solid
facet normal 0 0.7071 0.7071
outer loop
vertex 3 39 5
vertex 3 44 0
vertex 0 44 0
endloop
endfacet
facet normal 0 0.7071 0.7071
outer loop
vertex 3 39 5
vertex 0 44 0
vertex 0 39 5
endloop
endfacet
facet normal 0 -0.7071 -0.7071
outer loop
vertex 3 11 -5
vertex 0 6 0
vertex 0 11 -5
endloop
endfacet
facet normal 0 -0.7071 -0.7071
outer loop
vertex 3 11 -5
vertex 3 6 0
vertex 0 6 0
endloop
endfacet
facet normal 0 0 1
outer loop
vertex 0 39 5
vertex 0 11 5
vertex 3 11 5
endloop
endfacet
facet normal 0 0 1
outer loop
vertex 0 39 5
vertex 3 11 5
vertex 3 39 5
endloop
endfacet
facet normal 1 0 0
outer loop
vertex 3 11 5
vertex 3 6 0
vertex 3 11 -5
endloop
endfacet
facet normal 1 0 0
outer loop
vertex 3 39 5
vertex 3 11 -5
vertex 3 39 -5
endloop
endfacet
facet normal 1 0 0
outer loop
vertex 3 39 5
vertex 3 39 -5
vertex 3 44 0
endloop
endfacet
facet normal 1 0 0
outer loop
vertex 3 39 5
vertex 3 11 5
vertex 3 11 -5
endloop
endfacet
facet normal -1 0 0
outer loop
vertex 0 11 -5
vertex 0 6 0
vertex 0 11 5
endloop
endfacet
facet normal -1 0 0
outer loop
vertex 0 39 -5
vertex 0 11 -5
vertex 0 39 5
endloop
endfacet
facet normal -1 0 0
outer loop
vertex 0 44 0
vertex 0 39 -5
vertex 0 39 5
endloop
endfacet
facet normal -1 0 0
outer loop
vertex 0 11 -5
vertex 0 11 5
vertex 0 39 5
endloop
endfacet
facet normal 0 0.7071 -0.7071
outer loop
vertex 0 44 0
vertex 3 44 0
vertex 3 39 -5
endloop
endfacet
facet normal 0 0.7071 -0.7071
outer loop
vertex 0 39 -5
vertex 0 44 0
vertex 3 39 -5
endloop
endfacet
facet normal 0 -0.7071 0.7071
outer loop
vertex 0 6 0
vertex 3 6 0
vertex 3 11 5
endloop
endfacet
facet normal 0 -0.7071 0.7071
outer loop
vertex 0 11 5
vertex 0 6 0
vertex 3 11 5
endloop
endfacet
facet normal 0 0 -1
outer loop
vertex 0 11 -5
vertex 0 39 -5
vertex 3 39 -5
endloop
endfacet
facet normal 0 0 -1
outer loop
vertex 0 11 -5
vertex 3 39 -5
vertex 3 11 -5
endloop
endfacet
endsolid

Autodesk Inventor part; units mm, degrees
ref_plane "YZ Plane" through (0, 0, 0) normal (1, 0, 0) x (0, 1, 0)
ref_plane "XZ Plane" through (0, 0, 0) normal (0, 1, 0) x (-1, 0, 0)
ref_plane "XY Plane" through (0, 0, 0) normal (0, 0, 1) x (1, 0, 0)
sketch "Sketch1" plane through (0, 0, 0) normal (1, 0, 0) x (0, 1, 0)
  circle A0 centre (0, 0) radius 3.1
  arc A1 (0, 5) -> (0, -5) centre (0, 0) ccw
  line L0 (0, 5) -> (50, 5)
  line L1 (50, -5) -> (0, -5)
  arc A2 (50, -5) -> (50, 5) centre (50, 0) ccw
  circle A3 centre (50, 0) radius 3.1
  dimension "d0" = 6.2
  dimension "d1" = 10
  dimension "d3" = 50
  dimension "d5" = 6.2
  dimension "d26" = 5
extrude "Extrusion1" add sketch "Sketch1" along normal blind 3
ref_plane "Work Plane1" through (-2, 0, 0) normal (1, 0, 0) x (0, 0, -1)
sketch "Sketch5" plane through (3, 0, 0) normal (1, 0, 0) x (0, 0, -1)
  line L0 (-5, 50) -> (-5, 0) projected
  arc A0 (-5, 0) -> (5, 0) centre (0, 0) ccw projected
  circle A1 centre (0, 50) radius 3.1 projected
  circle A2 centre (0, 0) radius 3.1 projected
  arc A3 (-5, 0) -> (5, 0) centre (0, 0) ccw projected
  line L1 (5, 0) -> (5, 50) projected
  arc A4 (5, 50) -> (-5, 50) centre (0, 50) ccw projected
  line L2 (-5, 50) -> (-5, 0) projected
  line L3 (0, -5) -> (0, 6)
  line L4 (0, 6) -> (5, 11)
  line L5 (5, 0) -> (5, 50) projected
  line L6 (0, 6) -> (-5, 11)
  line L7 (0, 55) -> (0, 44)
  line L8 (0, 44) -> (-5, 39)
  line L9 (0, 44) -> (5, 39)
  line L10 (0, 44) -> (7.0711, 44) construction
  dimension "d27" = 11
  dimension "d28" = 135
  dimension "d29" = 11
  dimension "d30" = 135
  dimension "d31" = 45
extrude "Extrusion5" cut sketch "Sketch5" against normal blind 10 contours A4 L7 A1 L8 L0 | A4 L1 L9 L7 A1 | L6 L3 A2 A0 L0 | L7 A1 | A1 L7 | L4 L1 A0 L3 A2 | L3 A2 | A2 L3
equation "\"d5\" = d0"
equation "\"d26\" = 0.5 * d1"
equation "\"d29\" = d27"
equation "\"d30\" = d28"
properties part number "ArmSpanMid_01"
